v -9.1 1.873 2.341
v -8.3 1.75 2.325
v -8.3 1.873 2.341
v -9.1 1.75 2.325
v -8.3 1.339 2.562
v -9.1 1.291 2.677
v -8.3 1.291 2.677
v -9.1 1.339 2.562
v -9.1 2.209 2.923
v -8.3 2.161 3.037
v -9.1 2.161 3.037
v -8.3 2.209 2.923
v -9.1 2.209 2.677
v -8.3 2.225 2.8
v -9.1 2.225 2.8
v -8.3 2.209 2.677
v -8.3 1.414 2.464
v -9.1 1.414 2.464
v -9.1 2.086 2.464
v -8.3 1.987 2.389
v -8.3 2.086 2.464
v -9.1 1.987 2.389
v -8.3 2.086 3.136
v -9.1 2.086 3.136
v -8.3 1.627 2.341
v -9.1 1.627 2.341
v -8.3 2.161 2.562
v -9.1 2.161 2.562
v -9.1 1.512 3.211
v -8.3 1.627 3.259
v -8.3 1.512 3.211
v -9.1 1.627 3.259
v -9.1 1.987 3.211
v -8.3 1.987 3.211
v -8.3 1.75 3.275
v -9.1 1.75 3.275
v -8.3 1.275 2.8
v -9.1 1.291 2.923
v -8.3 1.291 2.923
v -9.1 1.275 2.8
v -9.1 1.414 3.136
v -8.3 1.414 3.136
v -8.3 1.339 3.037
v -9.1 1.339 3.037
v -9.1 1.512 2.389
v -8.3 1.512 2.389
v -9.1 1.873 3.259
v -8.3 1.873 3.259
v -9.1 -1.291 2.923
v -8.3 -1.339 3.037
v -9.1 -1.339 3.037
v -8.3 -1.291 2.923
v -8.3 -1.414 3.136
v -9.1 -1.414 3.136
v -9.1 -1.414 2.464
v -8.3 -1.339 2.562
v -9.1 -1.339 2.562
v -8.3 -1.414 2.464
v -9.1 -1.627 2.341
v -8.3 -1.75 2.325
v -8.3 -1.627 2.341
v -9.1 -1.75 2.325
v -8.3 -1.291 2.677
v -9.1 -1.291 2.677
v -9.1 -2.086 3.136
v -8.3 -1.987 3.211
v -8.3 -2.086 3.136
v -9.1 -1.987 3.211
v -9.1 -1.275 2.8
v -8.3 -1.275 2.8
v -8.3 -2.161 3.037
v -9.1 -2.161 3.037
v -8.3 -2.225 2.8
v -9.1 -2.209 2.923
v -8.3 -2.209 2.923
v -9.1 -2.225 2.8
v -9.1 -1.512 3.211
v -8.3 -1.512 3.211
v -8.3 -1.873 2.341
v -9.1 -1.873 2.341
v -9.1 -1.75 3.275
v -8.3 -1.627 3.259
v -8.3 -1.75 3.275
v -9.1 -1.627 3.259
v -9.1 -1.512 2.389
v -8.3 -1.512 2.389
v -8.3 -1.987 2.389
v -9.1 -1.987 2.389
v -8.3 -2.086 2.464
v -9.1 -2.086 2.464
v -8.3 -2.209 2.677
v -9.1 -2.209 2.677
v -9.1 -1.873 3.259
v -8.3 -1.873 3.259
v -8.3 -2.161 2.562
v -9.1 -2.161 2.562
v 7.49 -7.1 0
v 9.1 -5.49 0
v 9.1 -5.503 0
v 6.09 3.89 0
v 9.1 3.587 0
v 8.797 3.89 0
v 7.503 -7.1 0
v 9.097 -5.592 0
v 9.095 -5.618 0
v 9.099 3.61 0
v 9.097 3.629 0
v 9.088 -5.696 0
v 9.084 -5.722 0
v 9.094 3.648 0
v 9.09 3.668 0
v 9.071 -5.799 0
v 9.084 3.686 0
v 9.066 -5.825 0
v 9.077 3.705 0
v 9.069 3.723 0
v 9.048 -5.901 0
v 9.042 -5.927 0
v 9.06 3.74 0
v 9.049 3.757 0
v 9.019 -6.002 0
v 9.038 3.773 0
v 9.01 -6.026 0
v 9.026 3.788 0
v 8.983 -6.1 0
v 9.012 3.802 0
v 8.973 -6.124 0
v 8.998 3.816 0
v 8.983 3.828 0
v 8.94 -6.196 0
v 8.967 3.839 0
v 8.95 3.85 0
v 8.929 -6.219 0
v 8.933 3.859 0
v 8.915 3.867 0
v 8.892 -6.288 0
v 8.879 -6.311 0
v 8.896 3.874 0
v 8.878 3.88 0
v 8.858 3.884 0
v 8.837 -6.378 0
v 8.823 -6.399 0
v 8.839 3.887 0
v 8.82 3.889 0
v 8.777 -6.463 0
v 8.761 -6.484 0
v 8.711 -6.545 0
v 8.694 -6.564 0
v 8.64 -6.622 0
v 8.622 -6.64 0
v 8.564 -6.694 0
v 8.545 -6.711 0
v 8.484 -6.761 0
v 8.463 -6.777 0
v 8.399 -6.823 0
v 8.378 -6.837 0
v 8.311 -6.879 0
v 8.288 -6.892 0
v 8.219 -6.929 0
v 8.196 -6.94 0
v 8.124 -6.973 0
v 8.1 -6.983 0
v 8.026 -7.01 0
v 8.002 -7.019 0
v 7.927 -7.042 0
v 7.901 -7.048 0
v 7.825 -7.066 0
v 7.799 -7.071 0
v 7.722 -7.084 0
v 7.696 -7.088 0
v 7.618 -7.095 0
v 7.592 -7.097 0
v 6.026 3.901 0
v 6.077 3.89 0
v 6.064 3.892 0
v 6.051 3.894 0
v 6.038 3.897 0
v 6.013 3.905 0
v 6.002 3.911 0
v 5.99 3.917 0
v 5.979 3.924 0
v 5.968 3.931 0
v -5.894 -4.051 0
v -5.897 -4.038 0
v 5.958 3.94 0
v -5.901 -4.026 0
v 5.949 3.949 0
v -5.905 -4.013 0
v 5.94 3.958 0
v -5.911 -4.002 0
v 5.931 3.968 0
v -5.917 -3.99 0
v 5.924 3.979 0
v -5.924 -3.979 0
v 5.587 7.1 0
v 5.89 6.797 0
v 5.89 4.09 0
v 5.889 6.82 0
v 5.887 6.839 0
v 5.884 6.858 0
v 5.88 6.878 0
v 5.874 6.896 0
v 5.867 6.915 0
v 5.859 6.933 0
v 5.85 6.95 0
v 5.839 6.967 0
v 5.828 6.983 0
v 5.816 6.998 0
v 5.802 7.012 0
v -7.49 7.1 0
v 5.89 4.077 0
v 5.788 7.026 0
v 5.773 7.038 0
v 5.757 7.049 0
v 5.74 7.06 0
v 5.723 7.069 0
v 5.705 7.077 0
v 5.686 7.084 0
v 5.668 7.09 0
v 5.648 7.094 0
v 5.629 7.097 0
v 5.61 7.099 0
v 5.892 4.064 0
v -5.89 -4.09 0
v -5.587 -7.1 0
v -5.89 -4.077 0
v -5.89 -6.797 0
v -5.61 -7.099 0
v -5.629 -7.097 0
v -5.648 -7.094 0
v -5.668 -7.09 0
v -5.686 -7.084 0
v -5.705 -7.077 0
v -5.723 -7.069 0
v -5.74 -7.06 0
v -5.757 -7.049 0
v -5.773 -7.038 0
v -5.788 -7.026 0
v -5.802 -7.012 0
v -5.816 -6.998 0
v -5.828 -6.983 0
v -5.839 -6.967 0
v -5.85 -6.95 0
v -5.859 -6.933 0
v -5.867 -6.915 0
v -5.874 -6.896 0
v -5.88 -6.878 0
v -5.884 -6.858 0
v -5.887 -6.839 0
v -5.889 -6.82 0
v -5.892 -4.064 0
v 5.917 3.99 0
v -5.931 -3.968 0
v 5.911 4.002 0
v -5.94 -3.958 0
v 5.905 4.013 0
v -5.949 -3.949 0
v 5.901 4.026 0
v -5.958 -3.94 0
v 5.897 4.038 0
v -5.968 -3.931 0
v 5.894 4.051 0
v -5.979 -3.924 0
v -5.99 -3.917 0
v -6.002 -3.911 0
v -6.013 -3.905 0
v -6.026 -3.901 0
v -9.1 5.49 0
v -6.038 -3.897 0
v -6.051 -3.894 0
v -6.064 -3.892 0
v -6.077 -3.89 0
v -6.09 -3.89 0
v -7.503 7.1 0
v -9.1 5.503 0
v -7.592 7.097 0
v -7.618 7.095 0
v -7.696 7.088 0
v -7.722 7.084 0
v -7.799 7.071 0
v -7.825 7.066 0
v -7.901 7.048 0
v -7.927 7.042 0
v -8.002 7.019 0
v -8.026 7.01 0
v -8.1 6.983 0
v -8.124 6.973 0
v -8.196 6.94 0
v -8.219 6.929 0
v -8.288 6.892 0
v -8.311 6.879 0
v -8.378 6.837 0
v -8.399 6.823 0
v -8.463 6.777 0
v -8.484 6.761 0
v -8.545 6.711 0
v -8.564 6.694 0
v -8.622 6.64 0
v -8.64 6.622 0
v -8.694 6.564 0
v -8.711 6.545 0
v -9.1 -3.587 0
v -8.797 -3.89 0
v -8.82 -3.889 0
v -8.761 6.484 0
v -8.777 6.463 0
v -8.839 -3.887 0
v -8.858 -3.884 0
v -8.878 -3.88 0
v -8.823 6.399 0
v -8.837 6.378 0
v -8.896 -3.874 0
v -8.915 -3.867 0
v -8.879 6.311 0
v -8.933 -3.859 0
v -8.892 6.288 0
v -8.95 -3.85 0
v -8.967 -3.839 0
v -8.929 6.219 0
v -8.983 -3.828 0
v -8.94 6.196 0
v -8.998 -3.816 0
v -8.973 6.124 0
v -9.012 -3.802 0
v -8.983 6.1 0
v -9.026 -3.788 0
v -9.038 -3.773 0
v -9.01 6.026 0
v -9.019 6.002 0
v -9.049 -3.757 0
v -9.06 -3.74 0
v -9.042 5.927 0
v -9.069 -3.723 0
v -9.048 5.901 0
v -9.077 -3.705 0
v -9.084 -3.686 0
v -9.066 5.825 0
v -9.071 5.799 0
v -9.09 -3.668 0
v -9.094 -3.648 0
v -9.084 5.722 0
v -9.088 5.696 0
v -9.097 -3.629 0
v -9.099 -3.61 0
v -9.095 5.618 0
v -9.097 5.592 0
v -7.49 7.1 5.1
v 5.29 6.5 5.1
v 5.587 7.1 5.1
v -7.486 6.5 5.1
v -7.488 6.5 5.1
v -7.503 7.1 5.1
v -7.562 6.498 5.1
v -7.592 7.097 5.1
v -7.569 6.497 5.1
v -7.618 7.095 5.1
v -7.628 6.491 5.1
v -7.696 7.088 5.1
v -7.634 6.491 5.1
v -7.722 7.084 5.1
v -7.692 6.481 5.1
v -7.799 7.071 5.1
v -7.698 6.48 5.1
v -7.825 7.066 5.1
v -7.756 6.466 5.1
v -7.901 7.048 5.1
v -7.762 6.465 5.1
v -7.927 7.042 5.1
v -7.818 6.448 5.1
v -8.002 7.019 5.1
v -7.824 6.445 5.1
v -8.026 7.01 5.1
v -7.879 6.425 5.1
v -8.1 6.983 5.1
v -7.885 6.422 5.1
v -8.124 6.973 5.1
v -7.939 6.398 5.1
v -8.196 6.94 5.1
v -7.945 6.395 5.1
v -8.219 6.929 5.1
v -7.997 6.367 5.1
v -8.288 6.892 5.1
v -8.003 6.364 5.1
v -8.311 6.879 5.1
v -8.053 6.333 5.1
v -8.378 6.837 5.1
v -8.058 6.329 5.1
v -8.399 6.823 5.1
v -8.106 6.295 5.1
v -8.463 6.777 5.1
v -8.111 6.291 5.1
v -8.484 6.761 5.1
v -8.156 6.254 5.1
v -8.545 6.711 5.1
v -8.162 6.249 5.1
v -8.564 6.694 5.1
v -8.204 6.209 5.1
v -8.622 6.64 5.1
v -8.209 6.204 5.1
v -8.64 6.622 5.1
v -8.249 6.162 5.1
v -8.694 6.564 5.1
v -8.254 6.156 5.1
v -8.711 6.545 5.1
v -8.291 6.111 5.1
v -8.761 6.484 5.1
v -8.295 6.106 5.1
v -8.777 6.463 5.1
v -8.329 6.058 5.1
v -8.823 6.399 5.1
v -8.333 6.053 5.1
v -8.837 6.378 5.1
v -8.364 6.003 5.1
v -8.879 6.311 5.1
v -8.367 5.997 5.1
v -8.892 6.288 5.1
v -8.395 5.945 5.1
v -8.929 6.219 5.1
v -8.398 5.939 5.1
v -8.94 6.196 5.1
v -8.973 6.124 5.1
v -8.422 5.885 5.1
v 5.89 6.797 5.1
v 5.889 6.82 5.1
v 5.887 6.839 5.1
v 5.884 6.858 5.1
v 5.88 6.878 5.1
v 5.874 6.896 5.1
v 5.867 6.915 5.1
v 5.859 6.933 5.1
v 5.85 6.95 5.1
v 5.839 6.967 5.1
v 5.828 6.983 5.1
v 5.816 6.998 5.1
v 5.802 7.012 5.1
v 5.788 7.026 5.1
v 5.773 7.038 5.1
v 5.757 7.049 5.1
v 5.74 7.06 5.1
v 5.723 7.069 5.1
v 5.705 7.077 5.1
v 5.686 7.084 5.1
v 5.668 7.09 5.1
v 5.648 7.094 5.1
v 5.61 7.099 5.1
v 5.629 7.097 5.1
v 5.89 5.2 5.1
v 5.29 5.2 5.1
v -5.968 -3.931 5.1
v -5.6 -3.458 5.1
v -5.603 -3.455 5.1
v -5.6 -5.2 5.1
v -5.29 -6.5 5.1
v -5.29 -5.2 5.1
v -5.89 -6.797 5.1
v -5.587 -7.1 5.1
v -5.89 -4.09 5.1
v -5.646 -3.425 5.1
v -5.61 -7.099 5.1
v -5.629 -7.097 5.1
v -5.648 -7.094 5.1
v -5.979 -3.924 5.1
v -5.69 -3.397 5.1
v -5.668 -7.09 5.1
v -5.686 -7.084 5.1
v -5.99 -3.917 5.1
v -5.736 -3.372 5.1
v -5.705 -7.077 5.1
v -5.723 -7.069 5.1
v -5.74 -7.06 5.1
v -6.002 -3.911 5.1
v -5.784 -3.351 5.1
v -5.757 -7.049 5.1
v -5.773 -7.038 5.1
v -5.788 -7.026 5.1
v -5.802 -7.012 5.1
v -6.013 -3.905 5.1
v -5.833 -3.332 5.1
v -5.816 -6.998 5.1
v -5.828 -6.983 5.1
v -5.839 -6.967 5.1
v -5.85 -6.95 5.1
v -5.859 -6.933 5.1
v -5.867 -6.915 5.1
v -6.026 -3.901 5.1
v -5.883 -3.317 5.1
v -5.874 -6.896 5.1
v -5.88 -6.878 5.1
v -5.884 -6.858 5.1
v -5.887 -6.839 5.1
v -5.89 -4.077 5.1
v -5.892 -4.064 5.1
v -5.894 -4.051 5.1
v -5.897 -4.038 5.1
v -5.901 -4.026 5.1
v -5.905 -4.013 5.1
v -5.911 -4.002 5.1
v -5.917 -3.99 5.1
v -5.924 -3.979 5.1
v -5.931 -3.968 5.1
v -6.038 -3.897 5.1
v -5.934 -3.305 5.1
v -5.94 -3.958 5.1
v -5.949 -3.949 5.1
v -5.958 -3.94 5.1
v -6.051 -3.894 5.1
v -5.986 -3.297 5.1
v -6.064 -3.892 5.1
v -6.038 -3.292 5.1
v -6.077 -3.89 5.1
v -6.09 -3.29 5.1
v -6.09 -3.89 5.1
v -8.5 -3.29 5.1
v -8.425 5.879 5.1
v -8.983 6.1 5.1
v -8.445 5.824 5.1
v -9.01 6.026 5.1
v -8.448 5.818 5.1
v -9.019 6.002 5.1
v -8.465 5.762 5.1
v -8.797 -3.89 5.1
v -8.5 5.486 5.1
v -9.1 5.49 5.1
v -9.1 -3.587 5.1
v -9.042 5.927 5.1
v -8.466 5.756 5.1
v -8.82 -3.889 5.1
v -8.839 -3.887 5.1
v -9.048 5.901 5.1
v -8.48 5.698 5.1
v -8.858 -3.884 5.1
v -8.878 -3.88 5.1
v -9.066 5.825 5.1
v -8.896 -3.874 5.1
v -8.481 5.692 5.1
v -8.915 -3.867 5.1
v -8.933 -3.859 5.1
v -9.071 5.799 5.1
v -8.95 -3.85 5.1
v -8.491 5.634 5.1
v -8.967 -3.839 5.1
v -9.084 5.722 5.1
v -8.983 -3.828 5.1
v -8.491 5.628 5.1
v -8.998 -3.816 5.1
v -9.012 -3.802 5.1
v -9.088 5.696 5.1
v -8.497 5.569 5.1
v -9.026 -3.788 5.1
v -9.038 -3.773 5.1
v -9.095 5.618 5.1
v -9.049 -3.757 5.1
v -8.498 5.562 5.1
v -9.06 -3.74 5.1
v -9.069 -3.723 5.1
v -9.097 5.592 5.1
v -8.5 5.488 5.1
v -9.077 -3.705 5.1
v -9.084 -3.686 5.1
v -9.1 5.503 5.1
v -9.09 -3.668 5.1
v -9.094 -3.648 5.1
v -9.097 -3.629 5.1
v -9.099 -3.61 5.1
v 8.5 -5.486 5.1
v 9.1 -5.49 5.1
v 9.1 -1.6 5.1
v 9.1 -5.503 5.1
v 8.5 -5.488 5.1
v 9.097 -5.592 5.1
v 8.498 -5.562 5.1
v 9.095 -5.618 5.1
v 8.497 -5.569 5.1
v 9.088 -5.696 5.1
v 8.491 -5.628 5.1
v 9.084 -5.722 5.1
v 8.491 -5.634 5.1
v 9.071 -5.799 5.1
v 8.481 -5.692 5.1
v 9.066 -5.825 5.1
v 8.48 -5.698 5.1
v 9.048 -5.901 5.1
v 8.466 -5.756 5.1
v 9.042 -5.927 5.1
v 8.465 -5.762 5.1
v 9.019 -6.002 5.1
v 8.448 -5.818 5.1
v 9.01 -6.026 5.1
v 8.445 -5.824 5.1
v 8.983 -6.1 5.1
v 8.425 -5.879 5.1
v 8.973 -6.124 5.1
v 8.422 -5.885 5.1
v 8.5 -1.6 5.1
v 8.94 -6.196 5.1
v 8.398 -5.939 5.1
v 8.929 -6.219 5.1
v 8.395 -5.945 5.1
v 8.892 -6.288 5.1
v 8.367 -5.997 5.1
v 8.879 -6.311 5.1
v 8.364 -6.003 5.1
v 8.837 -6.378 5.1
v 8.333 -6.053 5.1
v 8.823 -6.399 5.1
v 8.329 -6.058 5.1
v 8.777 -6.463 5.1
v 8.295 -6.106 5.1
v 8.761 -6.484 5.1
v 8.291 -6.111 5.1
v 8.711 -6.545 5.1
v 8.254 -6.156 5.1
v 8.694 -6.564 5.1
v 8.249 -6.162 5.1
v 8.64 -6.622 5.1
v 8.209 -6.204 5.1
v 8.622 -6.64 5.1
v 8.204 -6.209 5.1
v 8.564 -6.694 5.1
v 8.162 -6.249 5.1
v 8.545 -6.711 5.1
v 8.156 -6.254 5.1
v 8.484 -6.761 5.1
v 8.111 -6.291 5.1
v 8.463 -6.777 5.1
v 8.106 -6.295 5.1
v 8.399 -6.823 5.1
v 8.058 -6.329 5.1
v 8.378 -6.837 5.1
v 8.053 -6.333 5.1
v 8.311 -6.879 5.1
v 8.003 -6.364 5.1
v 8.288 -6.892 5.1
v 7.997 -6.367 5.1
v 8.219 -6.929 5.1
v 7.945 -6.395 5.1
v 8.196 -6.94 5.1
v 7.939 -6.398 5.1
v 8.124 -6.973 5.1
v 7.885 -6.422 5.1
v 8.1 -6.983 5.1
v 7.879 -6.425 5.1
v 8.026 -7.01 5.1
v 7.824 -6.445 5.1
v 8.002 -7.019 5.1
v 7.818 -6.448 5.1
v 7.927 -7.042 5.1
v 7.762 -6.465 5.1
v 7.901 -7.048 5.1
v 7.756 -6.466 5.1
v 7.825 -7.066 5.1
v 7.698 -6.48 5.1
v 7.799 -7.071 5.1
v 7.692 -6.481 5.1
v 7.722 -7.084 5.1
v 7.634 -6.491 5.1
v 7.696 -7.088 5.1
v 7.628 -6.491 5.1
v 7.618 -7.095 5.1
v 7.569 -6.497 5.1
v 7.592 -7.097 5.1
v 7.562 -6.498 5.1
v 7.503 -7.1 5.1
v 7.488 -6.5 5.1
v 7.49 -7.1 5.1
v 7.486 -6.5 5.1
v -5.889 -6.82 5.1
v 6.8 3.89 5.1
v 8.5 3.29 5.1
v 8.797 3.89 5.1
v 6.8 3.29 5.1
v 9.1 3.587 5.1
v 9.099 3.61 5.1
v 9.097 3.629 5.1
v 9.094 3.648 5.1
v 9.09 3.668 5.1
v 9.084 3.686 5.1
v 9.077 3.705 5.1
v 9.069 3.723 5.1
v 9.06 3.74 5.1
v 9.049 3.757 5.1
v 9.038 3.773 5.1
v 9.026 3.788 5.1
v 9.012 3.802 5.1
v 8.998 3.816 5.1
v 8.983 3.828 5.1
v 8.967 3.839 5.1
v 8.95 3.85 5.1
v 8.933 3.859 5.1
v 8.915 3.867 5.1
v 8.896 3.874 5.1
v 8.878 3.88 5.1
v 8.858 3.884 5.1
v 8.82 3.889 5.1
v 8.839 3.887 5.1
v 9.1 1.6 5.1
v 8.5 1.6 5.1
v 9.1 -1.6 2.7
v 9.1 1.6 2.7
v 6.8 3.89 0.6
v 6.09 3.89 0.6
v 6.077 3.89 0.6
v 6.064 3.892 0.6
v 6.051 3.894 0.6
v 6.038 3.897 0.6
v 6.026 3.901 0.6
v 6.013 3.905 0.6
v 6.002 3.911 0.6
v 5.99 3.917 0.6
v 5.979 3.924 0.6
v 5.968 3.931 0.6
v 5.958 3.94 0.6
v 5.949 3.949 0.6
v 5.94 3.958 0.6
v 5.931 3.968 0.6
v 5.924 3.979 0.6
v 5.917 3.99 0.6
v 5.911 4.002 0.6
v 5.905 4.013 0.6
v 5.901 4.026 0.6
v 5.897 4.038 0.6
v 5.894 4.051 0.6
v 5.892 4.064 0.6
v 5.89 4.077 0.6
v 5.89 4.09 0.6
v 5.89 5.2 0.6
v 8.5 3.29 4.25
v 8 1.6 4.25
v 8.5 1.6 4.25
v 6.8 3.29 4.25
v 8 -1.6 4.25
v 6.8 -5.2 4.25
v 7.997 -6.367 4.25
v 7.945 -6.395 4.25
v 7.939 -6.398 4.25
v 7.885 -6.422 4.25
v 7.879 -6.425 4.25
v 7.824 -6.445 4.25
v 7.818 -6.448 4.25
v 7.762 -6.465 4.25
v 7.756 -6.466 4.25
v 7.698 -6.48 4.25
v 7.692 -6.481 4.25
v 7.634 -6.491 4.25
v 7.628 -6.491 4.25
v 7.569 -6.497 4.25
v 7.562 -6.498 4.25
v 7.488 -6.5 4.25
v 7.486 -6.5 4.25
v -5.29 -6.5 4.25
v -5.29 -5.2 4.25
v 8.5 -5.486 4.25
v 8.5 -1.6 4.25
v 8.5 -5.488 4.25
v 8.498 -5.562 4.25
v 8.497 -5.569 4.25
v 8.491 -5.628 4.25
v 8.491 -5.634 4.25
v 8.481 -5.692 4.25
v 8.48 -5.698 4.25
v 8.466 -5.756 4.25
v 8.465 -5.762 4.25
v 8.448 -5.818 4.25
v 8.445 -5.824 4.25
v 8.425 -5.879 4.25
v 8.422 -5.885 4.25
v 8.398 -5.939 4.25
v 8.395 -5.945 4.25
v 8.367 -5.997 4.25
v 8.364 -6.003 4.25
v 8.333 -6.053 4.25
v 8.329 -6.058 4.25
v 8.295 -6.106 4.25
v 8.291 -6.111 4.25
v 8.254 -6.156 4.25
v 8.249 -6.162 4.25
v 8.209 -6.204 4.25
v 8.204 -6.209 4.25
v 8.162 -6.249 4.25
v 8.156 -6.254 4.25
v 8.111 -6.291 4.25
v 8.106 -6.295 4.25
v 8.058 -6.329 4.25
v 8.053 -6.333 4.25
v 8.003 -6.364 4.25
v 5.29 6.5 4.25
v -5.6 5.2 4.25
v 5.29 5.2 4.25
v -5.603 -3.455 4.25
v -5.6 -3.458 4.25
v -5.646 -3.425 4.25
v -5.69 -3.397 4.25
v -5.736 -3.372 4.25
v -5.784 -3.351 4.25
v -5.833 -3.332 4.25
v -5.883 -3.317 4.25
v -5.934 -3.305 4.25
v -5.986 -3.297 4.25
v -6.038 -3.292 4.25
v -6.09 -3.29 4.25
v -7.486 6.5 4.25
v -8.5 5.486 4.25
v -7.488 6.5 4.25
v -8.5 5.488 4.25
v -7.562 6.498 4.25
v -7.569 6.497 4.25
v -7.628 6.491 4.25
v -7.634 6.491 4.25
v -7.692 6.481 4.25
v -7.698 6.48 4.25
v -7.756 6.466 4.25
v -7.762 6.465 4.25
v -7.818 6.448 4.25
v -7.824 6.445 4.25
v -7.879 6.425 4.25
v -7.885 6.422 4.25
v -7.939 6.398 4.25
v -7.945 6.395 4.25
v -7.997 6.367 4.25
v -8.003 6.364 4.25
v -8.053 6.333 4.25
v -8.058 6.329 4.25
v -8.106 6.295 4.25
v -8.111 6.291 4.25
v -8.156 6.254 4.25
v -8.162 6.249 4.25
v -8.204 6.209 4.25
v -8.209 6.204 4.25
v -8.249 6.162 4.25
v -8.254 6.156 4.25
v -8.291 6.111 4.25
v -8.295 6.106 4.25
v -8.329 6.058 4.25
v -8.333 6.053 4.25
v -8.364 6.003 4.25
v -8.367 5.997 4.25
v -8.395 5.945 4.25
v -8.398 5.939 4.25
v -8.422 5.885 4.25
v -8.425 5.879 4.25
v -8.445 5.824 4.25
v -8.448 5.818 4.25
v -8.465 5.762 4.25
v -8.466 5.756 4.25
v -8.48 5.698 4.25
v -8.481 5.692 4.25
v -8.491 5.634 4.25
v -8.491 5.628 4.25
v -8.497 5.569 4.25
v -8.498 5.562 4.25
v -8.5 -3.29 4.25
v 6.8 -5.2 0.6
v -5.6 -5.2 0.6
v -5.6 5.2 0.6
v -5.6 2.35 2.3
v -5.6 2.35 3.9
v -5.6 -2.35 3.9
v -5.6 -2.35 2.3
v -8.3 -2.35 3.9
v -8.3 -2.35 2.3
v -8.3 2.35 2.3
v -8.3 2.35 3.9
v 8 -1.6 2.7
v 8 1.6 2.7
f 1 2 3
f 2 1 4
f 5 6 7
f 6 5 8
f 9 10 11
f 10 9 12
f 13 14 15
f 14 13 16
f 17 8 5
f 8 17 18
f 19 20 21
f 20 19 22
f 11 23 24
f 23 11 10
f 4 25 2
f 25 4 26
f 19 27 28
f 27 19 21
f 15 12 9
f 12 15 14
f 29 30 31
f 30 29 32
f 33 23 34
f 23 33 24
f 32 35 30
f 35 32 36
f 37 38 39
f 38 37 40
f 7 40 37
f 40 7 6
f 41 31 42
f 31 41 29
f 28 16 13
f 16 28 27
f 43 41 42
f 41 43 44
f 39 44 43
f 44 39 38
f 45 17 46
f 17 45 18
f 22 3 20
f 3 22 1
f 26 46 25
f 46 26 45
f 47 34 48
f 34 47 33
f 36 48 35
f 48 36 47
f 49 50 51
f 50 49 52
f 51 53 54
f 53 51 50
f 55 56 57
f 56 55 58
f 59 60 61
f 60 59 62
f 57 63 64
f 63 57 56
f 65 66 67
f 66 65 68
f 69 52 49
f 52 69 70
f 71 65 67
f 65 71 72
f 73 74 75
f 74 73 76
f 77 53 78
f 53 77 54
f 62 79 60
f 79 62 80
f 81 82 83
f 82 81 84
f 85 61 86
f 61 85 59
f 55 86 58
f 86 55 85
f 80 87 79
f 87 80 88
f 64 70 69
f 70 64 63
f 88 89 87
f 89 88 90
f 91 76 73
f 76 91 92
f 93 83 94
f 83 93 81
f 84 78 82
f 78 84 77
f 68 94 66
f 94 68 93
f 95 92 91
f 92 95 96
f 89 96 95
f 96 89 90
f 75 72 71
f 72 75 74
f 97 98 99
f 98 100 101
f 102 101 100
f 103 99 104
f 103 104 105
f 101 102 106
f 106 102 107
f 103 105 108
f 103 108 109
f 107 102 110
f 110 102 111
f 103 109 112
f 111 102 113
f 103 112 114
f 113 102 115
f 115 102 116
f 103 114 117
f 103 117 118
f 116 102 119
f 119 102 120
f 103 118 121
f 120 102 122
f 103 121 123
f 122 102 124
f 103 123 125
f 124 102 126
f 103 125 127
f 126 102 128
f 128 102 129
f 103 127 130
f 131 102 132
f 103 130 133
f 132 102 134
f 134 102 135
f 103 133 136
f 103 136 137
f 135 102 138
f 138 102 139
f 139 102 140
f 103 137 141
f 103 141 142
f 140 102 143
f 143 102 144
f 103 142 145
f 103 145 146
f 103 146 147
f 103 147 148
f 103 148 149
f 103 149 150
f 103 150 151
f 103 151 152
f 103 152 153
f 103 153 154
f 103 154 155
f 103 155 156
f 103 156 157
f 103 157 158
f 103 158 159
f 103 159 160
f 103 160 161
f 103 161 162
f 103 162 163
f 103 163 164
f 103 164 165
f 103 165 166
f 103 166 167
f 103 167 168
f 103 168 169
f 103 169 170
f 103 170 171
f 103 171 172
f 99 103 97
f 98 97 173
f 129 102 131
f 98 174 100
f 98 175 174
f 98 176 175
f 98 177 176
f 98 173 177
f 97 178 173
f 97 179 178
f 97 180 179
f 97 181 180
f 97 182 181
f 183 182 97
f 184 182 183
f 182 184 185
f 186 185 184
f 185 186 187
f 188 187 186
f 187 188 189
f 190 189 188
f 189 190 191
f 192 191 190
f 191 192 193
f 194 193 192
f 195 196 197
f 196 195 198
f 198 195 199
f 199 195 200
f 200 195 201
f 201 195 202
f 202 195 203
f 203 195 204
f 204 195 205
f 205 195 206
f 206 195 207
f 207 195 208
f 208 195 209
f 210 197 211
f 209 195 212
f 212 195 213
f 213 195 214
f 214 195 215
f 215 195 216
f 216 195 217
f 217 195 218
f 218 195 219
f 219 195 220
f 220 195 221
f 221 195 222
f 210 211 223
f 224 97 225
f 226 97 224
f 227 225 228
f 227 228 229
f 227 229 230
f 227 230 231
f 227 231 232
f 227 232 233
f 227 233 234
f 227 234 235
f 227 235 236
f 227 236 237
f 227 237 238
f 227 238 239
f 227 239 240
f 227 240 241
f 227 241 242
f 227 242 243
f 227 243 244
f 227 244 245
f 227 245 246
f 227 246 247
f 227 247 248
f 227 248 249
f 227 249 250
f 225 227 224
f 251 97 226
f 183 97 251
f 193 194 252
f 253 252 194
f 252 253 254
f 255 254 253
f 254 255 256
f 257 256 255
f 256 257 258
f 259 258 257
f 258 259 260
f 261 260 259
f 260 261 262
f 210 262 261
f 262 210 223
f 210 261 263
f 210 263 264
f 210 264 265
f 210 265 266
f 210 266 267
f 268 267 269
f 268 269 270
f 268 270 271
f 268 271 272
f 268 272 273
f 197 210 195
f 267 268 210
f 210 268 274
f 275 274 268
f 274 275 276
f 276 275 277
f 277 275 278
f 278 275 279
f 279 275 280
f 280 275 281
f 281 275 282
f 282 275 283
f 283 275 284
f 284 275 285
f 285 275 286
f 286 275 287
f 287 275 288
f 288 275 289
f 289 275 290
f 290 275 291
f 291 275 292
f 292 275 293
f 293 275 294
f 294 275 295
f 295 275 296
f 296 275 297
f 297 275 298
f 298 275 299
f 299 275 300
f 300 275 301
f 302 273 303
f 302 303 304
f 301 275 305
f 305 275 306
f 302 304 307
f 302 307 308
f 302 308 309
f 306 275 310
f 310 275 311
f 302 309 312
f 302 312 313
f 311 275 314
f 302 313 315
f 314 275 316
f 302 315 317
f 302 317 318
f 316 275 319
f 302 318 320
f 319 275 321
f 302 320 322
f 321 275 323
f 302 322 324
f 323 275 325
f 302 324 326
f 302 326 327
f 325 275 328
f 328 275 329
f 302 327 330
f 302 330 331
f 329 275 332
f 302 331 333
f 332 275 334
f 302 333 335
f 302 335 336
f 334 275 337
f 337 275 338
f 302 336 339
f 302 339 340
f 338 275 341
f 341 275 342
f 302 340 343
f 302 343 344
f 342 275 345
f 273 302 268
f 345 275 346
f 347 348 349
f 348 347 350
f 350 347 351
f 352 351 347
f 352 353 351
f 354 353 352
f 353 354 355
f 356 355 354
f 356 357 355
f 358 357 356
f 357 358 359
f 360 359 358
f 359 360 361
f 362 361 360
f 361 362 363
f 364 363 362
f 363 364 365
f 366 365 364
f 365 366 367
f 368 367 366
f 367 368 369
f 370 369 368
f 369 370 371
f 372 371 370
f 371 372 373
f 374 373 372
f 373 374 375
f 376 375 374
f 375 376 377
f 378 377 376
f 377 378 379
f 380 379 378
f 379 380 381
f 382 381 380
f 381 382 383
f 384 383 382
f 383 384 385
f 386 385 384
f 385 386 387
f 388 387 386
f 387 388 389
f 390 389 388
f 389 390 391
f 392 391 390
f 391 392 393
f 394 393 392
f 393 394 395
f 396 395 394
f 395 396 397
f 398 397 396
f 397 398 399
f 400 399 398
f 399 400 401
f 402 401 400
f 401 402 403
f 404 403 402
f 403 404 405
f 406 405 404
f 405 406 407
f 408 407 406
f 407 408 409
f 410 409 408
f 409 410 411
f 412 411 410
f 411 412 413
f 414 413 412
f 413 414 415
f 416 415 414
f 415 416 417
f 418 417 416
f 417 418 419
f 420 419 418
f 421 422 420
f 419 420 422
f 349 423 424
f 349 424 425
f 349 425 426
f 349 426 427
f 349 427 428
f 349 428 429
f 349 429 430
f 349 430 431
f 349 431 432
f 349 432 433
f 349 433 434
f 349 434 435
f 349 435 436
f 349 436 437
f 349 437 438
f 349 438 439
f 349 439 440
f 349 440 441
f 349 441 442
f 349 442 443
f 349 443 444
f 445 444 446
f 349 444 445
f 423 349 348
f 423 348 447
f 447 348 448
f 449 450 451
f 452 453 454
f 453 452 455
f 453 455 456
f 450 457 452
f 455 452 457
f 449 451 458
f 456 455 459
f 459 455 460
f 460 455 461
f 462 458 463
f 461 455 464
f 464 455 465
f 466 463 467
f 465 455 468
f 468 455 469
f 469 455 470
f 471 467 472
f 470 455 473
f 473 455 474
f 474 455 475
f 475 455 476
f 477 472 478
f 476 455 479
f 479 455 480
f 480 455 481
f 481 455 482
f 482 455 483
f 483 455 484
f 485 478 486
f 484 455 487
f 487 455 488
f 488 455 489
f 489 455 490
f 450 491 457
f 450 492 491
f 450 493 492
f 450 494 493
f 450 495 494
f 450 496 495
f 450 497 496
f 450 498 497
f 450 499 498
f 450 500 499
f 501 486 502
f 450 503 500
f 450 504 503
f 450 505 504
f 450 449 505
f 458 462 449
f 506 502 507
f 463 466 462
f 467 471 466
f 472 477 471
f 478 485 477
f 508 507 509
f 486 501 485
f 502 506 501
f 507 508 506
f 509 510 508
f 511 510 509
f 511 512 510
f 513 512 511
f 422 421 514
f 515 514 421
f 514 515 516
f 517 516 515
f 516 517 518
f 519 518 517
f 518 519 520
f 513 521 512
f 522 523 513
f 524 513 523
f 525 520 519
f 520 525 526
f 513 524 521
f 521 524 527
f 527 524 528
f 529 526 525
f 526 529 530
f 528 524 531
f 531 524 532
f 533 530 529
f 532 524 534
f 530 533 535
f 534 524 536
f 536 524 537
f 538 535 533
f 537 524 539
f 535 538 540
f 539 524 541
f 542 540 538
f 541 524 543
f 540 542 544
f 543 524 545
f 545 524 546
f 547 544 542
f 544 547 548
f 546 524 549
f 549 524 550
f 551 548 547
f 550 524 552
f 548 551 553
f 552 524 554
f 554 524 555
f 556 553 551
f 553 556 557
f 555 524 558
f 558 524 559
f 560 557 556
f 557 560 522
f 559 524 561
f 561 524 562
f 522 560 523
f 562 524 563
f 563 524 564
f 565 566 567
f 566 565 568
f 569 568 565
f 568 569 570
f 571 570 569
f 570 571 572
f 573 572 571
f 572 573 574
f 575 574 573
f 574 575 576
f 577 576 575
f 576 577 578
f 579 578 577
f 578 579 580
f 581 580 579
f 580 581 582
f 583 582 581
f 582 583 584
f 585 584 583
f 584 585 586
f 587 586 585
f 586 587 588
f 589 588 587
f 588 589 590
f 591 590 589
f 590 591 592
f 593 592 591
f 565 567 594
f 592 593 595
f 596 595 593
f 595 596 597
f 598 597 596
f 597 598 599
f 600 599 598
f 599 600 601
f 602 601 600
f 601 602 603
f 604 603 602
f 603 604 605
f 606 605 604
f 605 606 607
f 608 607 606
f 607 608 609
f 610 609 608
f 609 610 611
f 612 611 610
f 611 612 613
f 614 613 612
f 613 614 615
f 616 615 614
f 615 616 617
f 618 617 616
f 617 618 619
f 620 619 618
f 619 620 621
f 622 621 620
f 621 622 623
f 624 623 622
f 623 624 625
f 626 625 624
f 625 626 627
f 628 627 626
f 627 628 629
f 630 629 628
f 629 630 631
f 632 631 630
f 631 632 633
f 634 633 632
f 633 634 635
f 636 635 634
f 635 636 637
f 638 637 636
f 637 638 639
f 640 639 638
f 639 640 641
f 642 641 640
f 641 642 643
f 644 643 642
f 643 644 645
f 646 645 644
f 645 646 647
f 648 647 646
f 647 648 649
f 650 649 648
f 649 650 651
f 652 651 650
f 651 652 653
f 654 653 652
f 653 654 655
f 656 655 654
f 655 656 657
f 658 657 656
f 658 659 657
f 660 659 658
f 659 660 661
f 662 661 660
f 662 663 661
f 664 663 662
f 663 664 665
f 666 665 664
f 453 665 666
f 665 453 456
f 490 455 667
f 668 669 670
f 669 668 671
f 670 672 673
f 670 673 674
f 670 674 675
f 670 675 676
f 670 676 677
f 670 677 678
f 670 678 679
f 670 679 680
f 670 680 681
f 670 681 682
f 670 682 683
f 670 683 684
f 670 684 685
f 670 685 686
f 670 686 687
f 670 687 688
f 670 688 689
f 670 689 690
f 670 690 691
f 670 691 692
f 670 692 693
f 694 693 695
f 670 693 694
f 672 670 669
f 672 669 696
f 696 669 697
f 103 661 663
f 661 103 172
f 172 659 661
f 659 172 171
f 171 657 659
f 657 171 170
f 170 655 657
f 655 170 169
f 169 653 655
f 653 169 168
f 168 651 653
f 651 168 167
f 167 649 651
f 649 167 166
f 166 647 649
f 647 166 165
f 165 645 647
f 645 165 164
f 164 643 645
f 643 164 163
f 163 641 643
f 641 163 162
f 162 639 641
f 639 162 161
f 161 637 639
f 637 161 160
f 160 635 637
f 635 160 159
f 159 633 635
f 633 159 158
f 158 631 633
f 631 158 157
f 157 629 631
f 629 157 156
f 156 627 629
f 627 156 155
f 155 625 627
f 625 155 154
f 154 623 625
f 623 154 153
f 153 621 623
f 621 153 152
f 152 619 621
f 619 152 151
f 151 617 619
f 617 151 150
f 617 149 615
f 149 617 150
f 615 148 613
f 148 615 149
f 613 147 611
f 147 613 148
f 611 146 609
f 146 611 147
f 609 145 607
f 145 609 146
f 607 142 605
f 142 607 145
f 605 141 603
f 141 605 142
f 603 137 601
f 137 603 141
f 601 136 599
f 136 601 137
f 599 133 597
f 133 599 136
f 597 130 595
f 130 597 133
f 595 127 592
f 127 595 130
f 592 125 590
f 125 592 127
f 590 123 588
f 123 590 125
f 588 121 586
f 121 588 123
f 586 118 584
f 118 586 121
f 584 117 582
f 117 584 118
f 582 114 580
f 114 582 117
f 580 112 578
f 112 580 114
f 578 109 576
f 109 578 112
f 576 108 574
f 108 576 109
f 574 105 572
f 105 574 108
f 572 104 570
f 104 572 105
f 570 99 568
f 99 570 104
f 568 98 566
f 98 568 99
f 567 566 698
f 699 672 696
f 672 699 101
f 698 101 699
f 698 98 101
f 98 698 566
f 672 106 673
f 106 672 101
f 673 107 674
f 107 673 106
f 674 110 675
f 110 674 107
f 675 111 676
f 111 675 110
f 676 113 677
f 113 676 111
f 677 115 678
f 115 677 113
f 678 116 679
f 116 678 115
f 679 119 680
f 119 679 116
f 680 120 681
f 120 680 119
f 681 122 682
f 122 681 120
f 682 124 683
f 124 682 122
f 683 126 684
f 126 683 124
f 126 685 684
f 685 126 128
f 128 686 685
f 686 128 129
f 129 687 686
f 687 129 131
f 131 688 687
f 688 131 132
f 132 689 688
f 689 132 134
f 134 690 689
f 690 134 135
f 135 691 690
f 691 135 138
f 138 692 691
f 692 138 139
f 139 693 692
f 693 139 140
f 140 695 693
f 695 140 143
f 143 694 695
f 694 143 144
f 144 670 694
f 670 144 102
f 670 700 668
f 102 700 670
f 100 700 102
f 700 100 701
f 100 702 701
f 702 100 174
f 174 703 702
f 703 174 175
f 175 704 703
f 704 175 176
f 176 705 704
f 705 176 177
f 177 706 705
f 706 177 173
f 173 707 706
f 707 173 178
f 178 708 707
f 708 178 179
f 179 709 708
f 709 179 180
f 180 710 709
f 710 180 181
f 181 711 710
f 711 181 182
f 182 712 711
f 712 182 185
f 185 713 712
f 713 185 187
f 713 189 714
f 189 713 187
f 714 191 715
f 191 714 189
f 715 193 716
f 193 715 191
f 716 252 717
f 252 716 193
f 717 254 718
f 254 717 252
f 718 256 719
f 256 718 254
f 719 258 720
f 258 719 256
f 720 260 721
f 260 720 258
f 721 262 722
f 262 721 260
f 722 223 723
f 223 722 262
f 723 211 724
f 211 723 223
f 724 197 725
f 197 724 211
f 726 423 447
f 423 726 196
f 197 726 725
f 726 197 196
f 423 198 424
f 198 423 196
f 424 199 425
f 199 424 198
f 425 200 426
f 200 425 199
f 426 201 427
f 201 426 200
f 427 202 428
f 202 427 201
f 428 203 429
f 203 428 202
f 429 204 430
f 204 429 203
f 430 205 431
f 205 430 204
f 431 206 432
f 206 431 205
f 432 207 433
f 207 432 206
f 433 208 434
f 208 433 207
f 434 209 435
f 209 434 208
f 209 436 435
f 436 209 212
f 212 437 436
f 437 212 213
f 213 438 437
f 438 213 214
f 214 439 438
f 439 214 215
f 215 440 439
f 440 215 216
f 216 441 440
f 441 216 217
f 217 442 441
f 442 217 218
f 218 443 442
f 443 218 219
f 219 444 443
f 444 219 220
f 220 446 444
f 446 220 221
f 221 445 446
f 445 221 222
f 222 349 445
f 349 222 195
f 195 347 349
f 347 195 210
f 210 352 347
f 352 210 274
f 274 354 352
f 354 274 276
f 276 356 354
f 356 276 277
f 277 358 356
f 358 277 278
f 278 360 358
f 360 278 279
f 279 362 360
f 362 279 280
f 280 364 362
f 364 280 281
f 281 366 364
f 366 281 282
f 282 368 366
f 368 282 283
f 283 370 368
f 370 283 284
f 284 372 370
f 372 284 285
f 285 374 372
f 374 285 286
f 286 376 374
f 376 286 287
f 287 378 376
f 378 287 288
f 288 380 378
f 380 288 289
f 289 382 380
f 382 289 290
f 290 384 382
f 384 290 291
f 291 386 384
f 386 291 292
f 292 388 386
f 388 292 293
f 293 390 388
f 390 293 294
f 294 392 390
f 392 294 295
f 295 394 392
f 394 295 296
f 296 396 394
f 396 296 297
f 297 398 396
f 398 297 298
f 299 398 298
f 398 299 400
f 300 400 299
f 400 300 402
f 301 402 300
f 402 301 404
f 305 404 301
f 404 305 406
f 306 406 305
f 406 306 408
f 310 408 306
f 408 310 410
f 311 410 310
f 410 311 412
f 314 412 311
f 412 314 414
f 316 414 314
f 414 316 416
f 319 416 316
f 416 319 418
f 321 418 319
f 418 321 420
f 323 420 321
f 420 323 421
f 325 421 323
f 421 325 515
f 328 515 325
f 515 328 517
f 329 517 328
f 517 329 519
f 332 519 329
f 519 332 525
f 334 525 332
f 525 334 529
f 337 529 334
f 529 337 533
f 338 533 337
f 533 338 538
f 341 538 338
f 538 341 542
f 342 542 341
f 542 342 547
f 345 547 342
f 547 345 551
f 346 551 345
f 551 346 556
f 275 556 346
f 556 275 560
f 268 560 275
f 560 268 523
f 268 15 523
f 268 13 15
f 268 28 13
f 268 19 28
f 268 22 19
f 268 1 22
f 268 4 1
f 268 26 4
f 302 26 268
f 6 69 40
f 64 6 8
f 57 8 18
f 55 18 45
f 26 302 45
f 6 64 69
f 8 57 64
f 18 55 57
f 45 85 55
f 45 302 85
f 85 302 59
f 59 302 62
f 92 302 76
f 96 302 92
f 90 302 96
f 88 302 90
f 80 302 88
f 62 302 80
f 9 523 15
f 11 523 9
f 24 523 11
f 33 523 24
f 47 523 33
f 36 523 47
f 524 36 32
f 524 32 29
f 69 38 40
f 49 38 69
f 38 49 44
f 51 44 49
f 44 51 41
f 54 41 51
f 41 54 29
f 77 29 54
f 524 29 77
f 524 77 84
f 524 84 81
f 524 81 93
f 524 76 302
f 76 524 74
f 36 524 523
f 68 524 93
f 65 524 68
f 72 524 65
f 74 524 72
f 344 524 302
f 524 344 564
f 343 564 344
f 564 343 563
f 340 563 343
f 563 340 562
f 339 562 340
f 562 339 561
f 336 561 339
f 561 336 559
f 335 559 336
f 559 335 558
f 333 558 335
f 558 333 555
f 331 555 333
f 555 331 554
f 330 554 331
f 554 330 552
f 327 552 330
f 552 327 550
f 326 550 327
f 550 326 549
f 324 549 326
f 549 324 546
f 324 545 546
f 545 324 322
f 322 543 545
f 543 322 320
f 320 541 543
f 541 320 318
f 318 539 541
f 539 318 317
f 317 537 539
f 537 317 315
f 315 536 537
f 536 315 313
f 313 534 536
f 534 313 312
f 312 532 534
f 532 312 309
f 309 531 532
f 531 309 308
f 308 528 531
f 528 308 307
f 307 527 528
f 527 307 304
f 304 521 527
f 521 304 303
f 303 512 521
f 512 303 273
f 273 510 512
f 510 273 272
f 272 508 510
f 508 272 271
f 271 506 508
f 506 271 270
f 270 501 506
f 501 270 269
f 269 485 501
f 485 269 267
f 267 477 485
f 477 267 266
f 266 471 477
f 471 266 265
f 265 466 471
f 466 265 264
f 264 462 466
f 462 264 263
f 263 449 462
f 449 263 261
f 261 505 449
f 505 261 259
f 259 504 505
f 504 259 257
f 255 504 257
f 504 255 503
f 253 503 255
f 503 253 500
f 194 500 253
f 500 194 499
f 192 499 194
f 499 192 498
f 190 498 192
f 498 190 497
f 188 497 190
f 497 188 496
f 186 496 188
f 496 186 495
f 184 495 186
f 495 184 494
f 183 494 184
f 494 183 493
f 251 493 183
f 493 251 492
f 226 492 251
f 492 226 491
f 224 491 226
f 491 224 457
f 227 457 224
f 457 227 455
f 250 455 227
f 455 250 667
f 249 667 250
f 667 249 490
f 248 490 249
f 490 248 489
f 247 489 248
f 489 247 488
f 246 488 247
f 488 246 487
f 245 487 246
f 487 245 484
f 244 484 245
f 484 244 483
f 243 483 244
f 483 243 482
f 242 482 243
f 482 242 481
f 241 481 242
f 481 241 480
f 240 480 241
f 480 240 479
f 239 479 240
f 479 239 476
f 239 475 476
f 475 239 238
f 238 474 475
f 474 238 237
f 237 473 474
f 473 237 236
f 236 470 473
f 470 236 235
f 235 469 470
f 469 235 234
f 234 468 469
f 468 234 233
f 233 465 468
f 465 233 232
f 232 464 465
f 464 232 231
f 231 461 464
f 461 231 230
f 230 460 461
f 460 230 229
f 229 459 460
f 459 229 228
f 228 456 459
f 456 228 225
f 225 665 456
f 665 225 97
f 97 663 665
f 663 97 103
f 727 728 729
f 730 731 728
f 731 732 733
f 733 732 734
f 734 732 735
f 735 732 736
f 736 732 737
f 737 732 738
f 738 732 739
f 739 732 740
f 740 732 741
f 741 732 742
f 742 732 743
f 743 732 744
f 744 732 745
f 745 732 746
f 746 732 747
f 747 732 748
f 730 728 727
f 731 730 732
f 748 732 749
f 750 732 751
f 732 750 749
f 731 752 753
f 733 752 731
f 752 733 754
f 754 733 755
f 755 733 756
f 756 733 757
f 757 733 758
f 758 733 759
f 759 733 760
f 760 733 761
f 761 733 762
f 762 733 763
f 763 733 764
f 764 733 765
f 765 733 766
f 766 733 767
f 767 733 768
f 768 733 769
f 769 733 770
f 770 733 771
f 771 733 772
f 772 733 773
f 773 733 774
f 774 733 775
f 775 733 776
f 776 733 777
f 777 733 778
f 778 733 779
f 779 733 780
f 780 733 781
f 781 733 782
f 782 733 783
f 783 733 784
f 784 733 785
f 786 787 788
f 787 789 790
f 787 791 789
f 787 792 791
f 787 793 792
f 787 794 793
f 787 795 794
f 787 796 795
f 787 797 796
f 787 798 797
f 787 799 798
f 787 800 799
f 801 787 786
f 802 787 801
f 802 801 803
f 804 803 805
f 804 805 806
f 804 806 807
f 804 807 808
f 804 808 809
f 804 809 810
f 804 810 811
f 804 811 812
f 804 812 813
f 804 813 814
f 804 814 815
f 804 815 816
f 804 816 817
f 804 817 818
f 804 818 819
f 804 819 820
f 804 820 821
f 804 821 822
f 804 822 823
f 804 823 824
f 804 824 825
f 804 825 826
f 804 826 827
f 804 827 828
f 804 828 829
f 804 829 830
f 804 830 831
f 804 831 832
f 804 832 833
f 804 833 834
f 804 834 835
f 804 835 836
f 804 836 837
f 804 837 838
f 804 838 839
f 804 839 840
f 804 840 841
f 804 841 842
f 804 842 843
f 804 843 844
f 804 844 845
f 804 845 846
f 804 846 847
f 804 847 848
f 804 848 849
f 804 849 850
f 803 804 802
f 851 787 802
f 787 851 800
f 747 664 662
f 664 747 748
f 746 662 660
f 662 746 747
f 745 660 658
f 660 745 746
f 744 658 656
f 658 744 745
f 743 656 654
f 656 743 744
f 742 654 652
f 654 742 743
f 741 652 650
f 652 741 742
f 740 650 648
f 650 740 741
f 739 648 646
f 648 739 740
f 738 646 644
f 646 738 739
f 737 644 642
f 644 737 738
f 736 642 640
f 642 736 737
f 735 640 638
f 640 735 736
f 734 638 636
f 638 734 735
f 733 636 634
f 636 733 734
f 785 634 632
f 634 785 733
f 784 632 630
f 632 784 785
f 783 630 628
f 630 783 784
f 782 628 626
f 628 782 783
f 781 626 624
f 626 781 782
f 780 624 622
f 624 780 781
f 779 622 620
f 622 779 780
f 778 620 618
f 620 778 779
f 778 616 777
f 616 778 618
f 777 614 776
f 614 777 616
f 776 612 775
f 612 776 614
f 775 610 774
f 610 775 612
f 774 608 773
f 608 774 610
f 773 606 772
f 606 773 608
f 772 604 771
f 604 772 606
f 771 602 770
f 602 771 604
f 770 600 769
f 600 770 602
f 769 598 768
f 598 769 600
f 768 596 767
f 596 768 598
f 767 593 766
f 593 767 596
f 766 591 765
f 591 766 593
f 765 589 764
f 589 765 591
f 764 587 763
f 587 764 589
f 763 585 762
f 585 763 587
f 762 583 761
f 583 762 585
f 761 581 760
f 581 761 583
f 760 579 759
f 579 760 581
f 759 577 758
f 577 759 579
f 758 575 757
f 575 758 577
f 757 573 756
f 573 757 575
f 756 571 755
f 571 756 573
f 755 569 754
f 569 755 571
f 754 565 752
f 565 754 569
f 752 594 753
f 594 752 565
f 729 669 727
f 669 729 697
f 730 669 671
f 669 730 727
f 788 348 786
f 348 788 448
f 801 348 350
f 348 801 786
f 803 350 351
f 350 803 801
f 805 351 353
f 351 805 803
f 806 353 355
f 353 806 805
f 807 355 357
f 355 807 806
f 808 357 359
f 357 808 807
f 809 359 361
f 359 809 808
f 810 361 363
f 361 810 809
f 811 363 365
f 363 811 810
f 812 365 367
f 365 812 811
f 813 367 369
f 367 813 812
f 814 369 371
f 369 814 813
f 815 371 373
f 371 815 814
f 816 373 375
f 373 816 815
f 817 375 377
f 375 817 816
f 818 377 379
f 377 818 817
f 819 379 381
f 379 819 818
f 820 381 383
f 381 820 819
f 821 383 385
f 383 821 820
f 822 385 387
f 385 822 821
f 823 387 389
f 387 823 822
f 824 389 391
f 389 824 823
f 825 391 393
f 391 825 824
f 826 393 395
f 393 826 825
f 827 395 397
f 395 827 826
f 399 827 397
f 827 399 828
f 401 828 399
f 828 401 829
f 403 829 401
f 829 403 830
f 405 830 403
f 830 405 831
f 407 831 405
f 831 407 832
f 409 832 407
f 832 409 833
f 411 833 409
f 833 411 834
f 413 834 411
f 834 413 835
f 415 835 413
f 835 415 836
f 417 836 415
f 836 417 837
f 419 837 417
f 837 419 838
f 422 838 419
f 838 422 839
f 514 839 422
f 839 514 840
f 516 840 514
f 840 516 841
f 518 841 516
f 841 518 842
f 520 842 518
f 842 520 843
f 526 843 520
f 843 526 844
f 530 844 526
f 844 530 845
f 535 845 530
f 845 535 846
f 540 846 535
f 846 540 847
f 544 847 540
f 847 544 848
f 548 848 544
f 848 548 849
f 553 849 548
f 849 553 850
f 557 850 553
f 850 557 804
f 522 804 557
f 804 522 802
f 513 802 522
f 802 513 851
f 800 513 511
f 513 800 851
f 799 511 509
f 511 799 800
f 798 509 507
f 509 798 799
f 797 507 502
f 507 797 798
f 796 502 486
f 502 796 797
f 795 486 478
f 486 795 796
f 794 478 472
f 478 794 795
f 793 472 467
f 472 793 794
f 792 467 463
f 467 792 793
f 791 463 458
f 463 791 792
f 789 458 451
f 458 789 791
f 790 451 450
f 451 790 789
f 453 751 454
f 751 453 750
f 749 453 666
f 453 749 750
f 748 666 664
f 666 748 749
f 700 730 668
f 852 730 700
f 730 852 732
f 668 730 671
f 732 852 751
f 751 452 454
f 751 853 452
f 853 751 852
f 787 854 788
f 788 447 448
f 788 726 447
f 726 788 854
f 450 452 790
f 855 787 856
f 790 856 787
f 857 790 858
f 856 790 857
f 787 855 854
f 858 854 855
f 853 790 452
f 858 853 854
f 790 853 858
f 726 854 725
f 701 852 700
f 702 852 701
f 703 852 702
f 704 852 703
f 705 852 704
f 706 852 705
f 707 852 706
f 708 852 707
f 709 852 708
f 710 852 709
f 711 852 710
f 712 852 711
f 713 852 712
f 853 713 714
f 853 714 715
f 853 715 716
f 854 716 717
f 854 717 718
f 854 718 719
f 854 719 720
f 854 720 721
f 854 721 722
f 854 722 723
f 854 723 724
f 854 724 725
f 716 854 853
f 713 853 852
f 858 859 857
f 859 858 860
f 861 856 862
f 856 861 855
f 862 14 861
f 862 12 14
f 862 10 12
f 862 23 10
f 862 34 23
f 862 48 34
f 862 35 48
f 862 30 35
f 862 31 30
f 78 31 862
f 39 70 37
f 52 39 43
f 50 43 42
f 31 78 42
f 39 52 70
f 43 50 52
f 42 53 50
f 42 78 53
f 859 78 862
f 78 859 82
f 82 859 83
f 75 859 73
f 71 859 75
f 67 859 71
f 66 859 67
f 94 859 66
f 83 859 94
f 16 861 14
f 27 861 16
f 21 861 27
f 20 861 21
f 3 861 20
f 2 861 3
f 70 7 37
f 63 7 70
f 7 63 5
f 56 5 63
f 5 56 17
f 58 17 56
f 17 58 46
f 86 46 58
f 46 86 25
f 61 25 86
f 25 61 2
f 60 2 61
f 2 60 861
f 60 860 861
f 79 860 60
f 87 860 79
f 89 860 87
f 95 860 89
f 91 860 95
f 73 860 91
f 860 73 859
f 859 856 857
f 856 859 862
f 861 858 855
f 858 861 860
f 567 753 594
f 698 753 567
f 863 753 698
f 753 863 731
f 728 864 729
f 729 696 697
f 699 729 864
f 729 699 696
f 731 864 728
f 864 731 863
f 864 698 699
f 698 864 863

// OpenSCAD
// Removable electronics cartridge (battery + PCB + LEDs + switch + contacts)
// and the LED diffuser / light chamber.
include <gl_lib.scad>
part = "cartridge";  // "cartridge" | "diffuser"
if (layout == "assembly") { if (part == "cartridge") cartridge(); else diffuser(); }
else if (part == "cartridge") face_up(y_cf) cartridge();
else face_down(y_cart1 + chamber_h) diffuser();          // LED pockets up
